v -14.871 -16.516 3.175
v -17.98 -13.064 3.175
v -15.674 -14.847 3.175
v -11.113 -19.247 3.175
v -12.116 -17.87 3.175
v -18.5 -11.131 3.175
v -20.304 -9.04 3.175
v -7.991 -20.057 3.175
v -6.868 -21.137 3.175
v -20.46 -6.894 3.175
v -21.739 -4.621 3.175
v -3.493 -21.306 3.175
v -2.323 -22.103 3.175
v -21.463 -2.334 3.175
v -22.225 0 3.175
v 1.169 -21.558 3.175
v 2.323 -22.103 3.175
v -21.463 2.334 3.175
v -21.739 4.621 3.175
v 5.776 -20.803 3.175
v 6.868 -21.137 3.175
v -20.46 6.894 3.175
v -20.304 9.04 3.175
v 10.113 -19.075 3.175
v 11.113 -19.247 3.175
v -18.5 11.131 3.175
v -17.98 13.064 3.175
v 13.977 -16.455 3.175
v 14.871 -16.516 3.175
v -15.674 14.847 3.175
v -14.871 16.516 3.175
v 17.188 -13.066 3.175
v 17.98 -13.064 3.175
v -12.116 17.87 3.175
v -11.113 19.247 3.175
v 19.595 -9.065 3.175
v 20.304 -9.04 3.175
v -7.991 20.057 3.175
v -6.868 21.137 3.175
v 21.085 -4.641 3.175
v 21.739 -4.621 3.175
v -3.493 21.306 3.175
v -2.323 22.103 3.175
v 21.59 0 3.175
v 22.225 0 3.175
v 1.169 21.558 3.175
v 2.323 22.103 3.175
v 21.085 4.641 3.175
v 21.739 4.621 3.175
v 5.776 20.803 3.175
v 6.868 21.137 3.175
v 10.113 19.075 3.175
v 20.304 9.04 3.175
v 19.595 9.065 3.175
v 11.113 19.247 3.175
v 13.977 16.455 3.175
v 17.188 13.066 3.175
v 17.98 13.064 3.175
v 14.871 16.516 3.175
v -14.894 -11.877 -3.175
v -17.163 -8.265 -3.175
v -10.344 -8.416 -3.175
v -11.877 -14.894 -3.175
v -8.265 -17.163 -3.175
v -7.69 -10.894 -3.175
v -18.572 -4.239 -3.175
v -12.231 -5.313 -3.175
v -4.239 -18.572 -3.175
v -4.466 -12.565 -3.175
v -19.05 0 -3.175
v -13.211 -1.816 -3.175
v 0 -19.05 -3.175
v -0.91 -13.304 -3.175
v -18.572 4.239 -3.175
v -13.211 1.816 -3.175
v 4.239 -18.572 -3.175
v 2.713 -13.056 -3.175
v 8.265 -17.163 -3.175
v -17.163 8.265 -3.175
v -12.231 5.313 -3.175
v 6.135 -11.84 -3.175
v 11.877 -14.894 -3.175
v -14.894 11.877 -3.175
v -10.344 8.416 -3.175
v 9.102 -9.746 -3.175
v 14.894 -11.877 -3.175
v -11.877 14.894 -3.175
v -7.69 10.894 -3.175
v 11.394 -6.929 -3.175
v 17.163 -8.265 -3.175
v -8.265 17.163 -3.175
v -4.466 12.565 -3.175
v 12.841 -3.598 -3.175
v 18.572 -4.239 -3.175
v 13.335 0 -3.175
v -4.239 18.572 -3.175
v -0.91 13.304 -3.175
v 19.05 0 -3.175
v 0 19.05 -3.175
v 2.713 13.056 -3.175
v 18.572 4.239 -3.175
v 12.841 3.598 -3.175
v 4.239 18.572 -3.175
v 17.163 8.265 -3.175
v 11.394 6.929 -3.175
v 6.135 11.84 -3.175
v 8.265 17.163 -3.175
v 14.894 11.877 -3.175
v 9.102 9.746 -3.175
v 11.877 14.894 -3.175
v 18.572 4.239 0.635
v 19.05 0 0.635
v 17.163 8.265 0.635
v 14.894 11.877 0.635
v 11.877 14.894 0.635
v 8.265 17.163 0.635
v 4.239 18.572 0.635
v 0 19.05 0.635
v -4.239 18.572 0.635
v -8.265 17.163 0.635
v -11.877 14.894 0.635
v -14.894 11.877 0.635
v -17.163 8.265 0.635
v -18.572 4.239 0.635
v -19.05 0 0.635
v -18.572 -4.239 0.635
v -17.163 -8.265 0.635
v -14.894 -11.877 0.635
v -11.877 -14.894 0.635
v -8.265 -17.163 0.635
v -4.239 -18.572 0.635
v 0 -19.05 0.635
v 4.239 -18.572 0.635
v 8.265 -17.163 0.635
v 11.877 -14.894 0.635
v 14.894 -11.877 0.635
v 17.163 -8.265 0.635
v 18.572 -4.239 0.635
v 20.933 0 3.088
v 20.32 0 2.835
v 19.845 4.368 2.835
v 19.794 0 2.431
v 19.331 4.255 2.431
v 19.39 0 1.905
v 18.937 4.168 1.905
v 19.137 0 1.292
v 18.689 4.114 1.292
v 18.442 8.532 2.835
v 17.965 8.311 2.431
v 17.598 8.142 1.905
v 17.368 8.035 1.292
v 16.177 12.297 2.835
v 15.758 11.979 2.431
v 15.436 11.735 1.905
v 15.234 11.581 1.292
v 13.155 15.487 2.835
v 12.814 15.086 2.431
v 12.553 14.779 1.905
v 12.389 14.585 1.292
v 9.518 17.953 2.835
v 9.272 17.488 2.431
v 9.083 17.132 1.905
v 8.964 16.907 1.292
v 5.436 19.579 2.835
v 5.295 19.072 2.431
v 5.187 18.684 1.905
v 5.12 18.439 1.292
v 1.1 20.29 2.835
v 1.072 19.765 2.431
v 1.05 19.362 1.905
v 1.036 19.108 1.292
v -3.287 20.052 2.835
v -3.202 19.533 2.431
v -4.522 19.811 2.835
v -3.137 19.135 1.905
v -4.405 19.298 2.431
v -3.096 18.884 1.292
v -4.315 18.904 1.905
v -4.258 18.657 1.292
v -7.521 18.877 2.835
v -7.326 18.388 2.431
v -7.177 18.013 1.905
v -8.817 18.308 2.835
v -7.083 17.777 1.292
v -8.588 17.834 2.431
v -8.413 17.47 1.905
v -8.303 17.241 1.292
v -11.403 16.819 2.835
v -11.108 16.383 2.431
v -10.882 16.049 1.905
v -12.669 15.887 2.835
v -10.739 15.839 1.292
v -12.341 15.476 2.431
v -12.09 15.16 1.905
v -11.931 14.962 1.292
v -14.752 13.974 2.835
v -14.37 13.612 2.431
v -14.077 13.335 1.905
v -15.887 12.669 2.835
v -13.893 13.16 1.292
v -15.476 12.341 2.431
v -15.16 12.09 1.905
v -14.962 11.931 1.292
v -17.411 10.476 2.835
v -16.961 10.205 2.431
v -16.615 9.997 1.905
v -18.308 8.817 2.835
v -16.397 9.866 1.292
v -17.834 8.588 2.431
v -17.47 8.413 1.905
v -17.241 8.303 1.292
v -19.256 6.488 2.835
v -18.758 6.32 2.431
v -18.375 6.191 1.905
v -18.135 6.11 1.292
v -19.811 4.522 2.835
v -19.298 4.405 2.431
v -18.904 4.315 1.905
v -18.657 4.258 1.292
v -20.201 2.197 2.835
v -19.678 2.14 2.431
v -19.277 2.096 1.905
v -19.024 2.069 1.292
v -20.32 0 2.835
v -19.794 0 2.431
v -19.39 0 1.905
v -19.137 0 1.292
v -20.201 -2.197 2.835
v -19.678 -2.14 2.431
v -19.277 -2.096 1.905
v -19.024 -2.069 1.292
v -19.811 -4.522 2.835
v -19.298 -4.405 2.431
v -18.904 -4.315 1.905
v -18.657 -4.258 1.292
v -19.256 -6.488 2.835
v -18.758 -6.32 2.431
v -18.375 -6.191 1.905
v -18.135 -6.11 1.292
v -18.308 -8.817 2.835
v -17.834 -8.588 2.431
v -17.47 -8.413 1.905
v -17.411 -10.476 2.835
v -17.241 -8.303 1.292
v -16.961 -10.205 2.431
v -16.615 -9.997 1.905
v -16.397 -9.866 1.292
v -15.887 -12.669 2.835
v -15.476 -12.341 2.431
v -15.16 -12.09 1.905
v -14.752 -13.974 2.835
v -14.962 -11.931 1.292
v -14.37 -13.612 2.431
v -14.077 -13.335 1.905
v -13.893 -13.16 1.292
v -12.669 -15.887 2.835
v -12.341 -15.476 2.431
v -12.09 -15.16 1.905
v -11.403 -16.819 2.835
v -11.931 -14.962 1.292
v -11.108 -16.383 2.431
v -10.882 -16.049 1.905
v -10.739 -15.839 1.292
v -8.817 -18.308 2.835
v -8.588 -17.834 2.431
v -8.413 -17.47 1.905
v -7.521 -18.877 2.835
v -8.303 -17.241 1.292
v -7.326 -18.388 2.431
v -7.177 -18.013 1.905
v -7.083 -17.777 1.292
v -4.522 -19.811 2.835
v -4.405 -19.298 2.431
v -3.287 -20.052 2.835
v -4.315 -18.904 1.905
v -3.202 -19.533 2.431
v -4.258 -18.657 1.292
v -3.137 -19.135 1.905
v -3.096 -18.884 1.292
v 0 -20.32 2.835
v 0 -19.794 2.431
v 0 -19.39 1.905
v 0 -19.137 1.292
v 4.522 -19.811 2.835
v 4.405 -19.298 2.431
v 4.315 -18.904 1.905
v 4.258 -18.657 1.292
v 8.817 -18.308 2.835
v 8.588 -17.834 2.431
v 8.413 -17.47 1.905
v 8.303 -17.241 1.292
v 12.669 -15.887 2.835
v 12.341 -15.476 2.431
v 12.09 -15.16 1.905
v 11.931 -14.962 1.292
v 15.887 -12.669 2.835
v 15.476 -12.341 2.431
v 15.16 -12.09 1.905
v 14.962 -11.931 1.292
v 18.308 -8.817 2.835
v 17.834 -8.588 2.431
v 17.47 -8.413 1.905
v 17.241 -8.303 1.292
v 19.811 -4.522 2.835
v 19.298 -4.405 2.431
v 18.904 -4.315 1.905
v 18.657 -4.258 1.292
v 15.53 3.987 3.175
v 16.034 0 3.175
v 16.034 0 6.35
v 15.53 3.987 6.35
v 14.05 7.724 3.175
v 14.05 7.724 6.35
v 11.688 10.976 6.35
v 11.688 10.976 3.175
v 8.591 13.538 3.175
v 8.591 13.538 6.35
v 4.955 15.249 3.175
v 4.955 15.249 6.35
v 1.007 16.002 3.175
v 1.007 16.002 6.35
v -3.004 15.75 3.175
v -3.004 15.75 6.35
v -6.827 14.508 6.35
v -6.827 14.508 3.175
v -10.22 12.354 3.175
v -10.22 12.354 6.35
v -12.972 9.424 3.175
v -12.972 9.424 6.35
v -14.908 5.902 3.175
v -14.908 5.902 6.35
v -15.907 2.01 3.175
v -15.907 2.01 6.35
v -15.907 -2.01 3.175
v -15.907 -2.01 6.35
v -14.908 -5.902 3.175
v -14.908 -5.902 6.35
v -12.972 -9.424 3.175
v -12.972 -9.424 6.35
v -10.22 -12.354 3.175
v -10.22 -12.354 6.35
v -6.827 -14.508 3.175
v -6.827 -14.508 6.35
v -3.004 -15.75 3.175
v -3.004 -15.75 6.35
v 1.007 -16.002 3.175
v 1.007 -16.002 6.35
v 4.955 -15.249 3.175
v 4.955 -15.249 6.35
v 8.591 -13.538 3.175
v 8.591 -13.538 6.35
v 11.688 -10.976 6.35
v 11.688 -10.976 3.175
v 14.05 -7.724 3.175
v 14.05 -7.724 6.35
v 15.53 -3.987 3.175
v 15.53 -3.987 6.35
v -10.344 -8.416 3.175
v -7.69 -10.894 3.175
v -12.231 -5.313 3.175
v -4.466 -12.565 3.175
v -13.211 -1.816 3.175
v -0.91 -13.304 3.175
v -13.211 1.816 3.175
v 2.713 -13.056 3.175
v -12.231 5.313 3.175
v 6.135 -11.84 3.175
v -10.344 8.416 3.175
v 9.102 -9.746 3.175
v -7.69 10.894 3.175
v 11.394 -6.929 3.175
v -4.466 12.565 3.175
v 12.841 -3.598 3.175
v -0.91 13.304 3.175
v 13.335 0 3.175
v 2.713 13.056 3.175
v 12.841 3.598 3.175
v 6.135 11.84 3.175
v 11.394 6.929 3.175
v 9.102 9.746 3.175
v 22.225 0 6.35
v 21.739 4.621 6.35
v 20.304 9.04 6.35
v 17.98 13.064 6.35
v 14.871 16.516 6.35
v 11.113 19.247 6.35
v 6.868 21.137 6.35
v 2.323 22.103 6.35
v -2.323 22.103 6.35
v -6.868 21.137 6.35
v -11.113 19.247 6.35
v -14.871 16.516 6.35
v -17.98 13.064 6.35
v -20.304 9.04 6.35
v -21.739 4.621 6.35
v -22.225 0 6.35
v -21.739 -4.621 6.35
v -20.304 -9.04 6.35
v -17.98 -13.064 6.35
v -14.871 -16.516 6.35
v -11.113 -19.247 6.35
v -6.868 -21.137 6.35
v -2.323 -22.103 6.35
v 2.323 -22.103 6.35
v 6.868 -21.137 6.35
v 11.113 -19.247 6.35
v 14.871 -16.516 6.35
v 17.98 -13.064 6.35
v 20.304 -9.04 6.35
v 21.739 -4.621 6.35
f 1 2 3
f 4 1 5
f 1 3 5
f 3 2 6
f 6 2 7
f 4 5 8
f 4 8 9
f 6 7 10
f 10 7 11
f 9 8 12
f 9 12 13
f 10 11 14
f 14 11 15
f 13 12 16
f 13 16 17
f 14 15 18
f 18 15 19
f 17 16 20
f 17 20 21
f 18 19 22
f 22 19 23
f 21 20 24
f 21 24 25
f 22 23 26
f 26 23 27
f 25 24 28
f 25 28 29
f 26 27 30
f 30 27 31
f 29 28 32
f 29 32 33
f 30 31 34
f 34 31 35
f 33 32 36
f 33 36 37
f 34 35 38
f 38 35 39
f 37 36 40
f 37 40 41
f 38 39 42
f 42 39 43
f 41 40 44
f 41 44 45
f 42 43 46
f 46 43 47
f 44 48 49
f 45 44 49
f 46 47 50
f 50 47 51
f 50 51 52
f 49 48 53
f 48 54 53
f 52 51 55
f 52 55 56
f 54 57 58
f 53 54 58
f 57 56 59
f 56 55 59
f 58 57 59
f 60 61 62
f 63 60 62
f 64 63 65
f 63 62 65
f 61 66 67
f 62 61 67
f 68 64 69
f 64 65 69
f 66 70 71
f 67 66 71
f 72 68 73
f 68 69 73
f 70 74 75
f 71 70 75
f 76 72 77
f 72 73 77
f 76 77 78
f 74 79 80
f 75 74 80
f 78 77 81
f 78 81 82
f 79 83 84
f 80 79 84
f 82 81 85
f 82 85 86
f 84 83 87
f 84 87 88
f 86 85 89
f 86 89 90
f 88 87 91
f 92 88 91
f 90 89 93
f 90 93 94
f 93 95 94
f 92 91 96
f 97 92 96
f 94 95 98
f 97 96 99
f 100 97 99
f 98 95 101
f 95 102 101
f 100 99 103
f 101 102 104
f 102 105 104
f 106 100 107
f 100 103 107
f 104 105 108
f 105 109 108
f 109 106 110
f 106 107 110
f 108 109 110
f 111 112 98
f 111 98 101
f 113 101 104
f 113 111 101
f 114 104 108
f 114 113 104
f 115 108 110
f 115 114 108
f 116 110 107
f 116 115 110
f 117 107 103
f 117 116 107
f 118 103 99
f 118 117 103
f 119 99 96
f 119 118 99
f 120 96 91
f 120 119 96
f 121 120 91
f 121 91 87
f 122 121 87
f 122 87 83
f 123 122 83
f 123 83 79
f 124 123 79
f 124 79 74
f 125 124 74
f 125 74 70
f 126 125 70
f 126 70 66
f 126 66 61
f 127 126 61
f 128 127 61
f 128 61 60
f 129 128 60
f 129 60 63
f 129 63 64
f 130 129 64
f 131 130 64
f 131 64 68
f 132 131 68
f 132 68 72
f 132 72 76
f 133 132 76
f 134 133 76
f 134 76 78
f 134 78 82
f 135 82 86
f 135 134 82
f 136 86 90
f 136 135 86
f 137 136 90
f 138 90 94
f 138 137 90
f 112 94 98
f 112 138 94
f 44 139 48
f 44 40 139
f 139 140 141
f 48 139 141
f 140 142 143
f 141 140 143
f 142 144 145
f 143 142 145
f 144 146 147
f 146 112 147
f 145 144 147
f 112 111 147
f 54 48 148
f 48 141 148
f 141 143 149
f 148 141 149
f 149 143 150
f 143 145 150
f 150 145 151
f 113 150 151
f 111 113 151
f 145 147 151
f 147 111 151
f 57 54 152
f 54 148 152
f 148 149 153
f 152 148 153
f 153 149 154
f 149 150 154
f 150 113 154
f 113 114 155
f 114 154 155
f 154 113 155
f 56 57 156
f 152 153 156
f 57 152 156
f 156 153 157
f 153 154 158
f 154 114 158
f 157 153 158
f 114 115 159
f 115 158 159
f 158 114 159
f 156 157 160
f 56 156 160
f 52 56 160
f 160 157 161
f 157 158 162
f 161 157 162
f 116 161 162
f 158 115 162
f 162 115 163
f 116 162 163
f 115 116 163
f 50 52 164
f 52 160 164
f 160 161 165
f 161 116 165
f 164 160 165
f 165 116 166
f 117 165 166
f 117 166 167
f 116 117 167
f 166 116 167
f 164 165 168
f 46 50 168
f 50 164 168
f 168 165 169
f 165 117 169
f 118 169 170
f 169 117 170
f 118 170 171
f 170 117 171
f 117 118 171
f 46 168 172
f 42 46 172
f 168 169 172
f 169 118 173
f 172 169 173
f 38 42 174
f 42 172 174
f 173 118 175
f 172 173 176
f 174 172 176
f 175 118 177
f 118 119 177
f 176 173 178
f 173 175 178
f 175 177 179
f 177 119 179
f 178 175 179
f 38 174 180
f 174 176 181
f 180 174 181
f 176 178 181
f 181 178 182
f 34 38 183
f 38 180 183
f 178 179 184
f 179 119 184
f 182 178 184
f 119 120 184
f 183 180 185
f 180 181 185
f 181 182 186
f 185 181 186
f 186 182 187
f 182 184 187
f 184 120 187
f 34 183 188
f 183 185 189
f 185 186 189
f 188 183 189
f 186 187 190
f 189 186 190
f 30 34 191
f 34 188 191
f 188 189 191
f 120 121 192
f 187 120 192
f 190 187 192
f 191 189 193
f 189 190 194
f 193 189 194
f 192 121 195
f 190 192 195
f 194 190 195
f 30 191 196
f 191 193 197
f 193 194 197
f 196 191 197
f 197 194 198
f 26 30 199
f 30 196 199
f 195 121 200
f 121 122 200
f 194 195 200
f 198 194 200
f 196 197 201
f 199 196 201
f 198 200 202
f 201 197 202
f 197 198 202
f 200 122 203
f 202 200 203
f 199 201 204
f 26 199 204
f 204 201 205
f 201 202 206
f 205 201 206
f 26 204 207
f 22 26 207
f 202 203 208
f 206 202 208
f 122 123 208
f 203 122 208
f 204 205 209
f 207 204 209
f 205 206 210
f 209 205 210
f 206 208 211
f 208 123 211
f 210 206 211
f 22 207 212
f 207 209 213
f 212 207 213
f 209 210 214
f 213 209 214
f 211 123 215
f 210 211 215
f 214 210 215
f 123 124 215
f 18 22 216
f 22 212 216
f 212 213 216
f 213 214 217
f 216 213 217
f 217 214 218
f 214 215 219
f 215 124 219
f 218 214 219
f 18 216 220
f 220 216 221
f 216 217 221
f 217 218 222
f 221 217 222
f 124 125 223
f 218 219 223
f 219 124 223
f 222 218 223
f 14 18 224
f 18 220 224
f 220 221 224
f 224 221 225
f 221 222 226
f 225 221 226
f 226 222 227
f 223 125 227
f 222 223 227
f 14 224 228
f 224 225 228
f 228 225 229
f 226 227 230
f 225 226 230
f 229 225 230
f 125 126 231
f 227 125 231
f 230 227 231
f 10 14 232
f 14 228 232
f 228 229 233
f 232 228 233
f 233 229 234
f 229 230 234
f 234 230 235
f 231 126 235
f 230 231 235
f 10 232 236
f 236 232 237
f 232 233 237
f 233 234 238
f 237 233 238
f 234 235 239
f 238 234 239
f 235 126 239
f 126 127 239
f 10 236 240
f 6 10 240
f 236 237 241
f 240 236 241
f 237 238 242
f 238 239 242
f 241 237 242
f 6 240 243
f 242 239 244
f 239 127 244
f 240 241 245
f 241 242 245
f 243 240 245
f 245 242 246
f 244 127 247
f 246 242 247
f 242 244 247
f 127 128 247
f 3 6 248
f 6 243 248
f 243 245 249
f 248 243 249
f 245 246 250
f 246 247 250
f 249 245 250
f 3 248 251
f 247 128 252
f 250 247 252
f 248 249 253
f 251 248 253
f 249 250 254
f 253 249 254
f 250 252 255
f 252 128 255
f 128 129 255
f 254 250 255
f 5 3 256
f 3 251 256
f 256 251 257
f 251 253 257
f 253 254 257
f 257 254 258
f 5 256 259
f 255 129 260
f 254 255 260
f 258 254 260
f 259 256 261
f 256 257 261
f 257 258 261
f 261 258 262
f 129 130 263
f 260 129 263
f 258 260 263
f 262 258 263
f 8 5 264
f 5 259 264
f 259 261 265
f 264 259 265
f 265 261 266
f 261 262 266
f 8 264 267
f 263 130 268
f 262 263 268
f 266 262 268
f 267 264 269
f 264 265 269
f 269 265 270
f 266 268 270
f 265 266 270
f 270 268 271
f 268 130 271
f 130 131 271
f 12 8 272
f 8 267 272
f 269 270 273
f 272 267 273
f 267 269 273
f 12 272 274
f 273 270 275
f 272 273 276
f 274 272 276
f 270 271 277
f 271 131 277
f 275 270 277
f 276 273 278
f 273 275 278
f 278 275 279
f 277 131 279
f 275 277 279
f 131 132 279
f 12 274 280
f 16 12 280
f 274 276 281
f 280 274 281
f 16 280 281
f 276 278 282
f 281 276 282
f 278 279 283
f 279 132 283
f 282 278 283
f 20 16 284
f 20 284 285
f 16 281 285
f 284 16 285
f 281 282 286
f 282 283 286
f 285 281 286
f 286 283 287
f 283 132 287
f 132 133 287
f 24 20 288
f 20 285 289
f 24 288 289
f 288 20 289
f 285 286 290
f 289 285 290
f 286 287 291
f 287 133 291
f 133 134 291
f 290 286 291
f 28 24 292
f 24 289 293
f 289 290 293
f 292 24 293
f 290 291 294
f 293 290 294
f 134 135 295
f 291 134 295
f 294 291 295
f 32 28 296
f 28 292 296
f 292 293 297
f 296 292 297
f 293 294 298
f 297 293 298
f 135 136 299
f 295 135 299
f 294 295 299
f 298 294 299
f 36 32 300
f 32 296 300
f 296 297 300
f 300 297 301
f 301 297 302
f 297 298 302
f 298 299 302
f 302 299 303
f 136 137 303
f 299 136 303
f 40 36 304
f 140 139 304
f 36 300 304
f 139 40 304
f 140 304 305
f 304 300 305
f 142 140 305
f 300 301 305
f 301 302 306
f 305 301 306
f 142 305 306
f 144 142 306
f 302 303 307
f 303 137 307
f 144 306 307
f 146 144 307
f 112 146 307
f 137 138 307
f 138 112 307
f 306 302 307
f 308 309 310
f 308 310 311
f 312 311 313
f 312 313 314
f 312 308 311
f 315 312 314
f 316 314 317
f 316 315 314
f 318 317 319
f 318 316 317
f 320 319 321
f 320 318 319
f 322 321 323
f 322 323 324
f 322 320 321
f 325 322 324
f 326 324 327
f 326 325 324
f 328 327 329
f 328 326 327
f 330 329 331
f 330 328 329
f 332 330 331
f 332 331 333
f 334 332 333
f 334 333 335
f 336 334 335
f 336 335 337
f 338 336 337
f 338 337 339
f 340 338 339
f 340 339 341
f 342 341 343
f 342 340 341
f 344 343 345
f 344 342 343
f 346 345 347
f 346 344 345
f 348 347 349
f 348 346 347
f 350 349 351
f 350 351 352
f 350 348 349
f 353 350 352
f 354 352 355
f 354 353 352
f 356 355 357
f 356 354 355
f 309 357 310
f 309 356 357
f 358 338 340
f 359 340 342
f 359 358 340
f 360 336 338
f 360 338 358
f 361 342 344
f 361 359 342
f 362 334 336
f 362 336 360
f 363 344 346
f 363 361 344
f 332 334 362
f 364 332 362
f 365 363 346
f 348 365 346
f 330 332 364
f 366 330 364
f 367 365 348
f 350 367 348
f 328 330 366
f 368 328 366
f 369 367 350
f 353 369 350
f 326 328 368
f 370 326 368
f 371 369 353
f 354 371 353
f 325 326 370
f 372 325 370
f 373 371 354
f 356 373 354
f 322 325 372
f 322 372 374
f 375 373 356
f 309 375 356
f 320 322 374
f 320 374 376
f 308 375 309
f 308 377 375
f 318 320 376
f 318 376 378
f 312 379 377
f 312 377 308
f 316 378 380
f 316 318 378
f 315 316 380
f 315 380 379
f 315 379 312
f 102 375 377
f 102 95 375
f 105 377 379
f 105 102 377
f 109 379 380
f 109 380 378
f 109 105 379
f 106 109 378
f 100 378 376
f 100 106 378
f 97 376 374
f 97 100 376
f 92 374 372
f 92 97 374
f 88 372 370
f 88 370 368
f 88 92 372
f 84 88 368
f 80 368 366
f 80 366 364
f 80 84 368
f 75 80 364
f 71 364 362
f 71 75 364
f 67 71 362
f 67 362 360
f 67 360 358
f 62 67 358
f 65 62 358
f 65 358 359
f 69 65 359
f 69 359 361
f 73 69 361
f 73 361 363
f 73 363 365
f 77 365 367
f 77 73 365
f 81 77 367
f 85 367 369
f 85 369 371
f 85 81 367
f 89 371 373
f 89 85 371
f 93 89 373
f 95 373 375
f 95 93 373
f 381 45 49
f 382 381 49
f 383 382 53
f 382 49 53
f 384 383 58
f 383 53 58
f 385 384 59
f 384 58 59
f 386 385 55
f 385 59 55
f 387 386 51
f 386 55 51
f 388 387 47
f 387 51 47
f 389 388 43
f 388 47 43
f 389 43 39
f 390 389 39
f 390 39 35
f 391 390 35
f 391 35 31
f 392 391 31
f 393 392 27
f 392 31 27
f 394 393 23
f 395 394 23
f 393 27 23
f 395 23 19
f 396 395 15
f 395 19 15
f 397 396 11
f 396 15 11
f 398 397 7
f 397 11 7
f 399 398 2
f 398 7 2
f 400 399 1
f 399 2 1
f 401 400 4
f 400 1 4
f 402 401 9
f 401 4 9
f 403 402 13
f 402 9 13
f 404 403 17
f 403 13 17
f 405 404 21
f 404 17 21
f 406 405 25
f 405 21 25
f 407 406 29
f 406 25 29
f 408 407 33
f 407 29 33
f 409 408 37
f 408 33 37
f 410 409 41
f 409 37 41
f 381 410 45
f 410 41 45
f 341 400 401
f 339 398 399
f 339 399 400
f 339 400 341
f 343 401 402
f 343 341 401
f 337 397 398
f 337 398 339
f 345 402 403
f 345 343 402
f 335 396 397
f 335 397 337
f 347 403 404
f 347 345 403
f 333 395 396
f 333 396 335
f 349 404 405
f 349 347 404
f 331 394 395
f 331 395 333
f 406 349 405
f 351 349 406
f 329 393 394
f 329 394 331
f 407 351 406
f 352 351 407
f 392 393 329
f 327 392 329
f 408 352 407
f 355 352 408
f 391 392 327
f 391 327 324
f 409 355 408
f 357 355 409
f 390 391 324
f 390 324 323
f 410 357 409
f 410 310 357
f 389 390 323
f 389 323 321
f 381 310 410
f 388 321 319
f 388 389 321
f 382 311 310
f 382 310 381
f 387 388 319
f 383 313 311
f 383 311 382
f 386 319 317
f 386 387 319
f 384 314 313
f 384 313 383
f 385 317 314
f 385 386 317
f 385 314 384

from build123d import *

# Parameters (mm, degrees)
SKETCH1_R           = 19.05
SKETCH1_R_2         = 13.335
BOSS_EXTRUDE1_DEPTH = 3.175
SKETCH2_R           = 22.225
SKETCH2_R_2         = 16.03375
BOSS_EXTRUDE2_DEPTH = 3.175
FILLET1_R           = 2.54


with BuildPart() as part:
    # Sketch1 → Boss-Extrude1 (new, symmetric)
    with BuildSketch(Plane.XY):
        Circle(SKETCH1_R)
        Circle(SKETCH1_R_2, mode=Mode.SUBTRACT)
    extrude(amount=BOSS_EXTRUDE1_DEPTH, both=True)

    # Sketch2 → Boss-Extrude2 (add)
    with BuildSketch(Plane.XY.offset(3.175)):
        Circle(SKETCH2_R)
        Circle(SKETCH2_R_2, mode=Mode.SUBTRACT)
    extrude(amount=BOSS_EXTRUDE2_DEPTH)

    # Fillet1
    fillet1_edges = [part.edges().sort_by_distance(p)[0] for p in [
        (-19.05, 0, 3.175),
    ]]
    fillet(fillet1_edges, radius=FILLET1_R)


solid = part.part
